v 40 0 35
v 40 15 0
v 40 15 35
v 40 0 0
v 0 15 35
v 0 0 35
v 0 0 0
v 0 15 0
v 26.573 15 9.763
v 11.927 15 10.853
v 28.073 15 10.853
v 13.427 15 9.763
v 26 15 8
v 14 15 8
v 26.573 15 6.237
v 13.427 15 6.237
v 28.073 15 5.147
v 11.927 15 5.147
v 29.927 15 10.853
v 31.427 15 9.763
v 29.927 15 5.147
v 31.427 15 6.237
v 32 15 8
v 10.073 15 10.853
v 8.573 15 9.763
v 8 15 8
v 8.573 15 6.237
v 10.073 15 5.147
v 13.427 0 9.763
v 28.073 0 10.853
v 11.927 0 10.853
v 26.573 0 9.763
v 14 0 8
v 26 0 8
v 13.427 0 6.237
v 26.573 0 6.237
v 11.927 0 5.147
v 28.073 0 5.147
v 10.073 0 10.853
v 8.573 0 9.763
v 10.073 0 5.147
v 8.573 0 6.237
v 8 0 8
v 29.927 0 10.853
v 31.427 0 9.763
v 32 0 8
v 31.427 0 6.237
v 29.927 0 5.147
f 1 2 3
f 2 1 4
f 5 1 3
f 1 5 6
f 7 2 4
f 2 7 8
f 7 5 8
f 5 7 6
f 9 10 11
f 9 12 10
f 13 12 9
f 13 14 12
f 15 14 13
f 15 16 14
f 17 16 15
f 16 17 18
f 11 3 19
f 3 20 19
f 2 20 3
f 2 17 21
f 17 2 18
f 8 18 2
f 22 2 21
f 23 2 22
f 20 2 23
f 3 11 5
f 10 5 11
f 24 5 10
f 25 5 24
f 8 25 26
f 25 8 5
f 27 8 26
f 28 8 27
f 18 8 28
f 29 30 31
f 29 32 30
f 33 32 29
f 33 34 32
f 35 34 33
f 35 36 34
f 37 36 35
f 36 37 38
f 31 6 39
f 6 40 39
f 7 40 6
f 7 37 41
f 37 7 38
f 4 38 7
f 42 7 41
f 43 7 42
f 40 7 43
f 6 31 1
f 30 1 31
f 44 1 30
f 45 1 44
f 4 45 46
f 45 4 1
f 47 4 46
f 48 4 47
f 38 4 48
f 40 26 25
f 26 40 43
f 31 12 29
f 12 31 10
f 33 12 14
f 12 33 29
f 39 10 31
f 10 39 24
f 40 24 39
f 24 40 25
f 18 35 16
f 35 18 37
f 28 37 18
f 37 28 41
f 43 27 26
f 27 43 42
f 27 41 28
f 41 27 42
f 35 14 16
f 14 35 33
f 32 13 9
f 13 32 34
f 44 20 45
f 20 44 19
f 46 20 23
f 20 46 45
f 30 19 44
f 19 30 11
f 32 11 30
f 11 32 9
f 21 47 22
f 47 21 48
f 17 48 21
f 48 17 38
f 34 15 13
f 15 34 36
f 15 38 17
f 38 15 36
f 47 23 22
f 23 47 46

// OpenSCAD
echo(version=version());
//Base();

wheelAttach(40, 15 ,35);

module Base(diameter=100, height=3, cubeWidth=50, cubeHeight=50) {
    
    cubePos = diameter/2 ;
    negCubePos = -cubePos - cubeWidth;
    
    translate([0,0,0])
    cylinder(height, diameter, diameter);
    
    translate([cubePos, cubePos, 0])
        wheelAttach();
    translate([negCubePos, cubePos, 0])
        wheelAttach();
    translate([negCubePos, negCubePos, 0])
        wheelAttach();
    translate([cubePos, negCubePos,0])
        wheelAttach();
 

}

module wheelAttach(width=50, prof = 50, height=15) {
    color("red") 
    difference() {
        cube([width, prof, height]);
        translate([11,0,8]) rotate ([90,0,0]) cylinder(500, 3, 3, true);
        translate([29,0,8]) rotate ([90,0,0]) cylinder(500, 3, 3, true);
    }
}
